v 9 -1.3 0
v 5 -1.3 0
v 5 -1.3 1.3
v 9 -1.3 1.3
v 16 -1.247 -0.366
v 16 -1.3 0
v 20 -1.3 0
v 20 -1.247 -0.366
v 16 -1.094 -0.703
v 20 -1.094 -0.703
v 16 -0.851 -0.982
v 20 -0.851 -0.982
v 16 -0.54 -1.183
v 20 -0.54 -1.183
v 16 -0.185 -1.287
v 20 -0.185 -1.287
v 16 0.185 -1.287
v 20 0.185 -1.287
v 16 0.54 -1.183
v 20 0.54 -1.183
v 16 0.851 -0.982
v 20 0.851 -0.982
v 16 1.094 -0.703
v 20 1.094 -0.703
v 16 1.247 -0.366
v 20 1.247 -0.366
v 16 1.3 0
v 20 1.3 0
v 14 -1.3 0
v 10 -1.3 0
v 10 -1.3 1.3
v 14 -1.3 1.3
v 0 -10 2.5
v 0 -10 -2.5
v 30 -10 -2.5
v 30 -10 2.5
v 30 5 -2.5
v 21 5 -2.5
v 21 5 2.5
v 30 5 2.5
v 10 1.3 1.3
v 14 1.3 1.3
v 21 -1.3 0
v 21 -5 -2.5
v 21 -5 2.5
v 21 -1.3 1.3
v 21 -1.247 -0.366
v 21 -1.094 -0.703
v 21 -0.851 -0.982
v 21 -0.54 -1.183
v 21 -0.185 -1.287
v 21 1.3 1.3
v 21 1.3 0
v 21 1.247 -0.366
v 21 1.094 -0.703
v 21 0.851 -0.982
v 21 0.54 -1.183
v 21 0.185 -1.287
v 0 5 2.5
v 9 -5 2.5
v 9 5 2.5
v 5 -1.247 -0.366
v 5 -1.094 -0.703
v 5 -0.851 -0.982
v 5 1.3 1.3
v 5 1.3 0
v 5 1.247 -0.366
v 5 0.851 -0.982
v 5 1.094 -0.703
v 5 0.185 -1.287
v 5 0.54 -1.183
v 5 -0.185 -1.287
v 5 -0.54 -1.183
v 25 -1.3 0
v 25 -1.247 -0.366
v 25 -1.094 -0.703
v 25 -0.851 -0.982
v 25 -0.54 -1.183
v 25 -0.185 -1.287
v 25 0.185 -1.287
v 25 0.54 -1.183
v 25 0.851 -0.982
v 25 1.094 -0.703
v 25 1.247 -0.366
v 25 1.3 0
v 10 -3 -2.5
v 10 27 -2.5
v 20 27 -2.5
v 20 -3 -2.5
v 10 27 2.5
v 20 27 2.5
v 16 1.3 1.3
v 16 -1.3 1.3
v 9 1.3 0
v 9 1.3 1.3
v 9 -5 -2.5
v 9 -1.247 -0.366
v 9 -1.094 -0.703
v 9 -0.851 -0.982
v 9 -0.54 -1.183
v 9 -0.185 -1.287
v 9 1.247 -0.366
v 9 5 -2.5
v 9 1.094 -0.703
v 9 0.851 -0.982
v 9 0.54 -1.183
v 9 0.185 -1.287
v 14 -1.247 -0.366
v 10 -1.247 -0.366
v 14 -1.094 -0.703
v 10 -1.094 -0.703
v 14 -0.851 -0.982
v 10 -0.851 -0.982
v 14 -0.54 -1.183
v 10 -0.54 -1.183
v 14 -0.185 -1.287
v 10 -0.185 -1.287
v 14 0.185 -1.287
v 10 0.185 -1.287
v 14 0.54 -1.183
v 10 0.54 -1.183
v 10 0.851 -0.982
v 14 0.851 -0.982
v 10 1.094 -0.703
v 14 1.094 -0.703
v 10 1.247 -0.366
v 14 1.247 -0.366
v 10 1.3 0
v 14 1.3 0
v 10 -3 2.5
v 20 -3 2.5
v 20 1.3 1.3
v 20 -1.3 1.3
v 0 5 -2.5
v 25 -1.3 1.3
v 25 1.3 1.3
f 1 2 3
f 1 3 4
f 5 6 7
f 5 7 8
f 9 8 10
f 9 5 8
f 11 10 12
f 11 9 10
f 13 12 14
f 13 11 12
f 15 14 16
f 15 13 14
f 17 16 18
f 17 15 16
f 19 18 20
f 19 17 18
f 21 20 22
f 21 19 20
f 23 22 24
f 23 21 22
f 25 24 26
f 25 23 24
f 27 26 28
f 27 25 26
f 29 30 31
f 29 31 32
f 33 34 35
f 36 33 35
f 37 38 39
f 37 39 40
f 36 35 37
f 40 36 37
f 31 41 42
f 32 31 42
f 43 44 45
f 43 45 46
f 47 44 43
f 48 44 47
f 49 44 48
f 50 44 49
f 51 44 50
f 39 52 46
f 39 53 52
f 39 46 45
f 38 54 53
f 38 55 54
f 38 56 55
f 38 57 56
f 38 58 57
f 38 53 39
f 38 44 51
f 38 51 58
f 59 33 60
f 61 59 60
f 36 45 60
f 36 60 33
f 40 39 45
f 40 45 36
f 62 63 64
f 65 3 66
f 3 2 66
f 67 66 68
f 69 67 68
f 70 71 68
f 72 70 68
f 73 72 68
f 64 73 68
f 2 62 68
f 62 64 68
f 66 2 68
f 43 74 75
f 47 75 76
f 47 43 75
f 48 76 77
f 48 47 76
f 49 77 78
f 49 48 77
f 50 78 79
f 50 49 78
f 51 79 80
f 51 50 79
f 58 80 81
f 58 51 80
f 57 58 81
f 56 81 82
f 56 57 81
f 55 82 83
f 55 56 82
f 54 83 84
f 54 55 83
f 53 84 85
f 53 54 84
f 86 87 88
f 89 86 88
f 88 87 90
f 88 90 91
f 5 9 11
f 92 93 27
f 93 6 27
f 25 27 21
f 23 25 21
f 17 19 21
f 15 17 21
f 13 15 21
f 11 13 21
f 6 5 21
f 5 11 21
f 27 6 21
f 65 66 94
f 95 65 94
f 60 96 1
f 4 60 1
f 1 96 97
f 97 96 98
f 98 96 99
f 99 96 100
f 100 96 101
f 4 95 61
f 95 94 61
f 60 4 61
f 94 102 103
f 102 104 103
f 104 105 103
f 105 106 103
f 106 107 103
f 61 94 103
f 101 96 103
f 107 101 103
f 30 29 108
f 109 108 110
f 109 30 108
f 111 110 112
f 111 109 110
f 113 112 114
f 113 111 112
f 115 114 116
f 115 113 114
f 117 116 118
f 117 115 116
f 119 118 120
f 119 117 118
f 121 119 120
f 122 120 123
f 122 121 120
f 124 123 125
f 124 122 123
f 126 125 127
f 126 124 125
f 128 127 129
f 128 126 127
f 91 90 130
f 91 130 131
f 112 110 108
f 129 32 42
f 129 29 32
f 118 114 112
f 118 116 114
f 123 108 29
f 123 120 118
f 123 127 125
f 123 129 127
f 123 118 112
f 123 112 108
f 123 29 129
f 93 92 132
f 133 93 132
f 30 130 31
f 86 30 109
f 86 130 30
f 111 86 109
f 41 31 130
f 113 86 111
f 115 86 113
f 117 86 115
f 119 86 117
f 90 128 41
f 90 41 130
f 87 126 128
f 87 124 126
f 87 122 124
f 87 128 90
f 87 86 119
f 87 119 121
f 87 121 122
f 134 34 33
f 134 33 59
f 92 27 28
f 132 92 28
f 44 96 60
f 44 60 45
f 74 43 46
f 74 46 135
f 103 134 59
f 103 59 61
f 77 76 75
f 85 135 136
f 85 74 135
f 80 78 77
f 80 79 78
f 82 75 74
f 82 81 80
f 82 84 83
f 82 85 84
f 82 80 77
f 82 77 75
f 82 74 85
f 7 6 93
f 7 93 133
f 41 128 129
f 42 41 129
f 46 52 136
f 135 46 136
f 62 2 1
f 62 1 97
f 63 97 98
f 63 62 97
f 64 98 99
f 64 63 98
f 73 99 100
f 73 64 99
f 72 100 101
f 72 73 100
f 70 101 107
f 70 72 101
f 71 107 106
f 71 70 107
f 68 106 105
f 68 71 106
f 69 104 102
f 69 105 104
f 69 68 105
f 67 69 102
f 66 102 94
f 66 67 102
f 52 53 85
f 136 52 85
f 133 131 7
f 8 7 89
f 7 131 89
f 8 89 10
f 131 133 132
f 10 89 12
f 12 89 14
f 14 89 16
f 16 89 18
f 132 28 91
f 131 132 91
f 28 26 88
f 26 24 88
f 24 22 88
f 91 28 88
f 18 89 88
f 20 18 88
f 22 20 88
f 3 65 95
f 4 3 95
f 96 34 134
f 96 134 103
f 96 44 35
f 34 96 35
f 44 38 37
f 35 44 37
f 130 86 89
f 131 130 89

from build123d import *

# Parameters (mm, degrees)
BOX004_W          = 9
BOX004_H          = 2.6
BOX004_DEPTH      = 1.3
CYLINDER002_R     = 1.3
CYLINDER002_DEPTH = 9
BOX002_W          = 9
BOX002_H          = 2.6
BOX002_DEPTH      = 1.3
CYLINDER001_R     = 1.3
CYLINDER001_DEPTH = 9
BOX001_W          = 10
BOX001_H          = 30
BOX001_DEPTH      = 5
BOX003_W          = 12
BOX003_H          = 30
BOX003_DEPTH      = 5
BOX_W             = 30
BOX_H             = 15
BOX_DEPTH         = 5


with BuildPart() as cube004:
    # Box004 → Box004 (new body)
    with BuildSketch(Plane(origin=(5, -1.3, 0), x_dir=(1, 0, 0), z_dir=(0, 0, 1))):
        with Locations((4.5, 1.3)):
            Rectangle(BOX004_W, BOX004_H)
    extrude(amount=BOX004_DEPTH)


with BuildPart() as fusion001:
    # Cylinder002 → Cylinder002 (new body)
    with BuildSketch(Plane(origin=(5, 0, 0), x_dir=(0, 0, -1), z_dir=(1, 0, 0))):
        Circle(CYLINDER002_R)
    extrude(amount=CYLINDER002_DEPTH)

    # Fusion001: union Cube004
    add(cube004.part)


with BuildPart() as fusion001_1:
    # Fusion001 placement: moved
    add(fusion001.part.moved(Location((11, 0, 0))))


with BuildPart() as cube002:
    # Box002 → Box002 (new body)
    with BuildSketch(Plane(origin=(5, -1.3, 0), x_dir=(1, 0, 0), z_dir=(0, 0, 1))):
        with Locations((4.5, 1.3)):
            Rectangle(BOX002_W, BOX002_H)
    extrude(amount=BOX002_DEPTH)


with BuildPart() as fusion002:
    # Cylinder001 → Cylinder001 (new body)
    with BuildSketch(Plane(origin=(5, 0, 0), x_dir=(0, 0, -1), z_dir=(1, 0, 0))):
        Circle(CYLINDER001_R)
    extrude(amount=CYLINDER001_DEPTH)

    # Fusion: union Cube002
    add(cube002.part)

    # Fusion002: union Fusion001
    add(fusion001_1.part)


with BuildPart() as cube001:
    # Box001 → Box001 (new body)
    with BuildSketch(Plane(origin=(10, -3, -2.5), x_dir=(1, 0, 0), z_dir=(0, 0, 1))):
        with Locations((5, 15)):
            Rectangle(BOX001_W, BOX001_H)
    extrude(amount=BOX001_DEPTH)


with BuildPart() as cube003:
    # Box003 → Box003 (new body)
    with BuildSketch(Plane(origin=(9, -5, -2.5), x_dir=(1, 0, 0), z_dir=(0, 0, 1))):
        with Locations((6, 15)):
            Rectangle(BOX003_W, BOX003_H)
    extrude(amount=BOX003_DEPTH)


with BuildPart() as cut001:
    # Box → Box (new body)
    with BuildSketch(Plane(origin=(0, -10, -2.5), x_dir=(1, 0, 0), z_dir=(0, 0, 1))):
        with Locations((15, 7.5)):
            Rectangle(BOX_W, BOX_H)
    extrude(amount=BOX_DEPTH)

    # Cut: cut Cube003
    add(cube003.part, mode=Mode.SUBTRACT)

    # Fusion003: union Cube001
    add(cube001.part)

    # Cut001: cut Fusion002
    add(fusion002.part, mode=Mode.SUBTRACT)


solid = cut001.part
